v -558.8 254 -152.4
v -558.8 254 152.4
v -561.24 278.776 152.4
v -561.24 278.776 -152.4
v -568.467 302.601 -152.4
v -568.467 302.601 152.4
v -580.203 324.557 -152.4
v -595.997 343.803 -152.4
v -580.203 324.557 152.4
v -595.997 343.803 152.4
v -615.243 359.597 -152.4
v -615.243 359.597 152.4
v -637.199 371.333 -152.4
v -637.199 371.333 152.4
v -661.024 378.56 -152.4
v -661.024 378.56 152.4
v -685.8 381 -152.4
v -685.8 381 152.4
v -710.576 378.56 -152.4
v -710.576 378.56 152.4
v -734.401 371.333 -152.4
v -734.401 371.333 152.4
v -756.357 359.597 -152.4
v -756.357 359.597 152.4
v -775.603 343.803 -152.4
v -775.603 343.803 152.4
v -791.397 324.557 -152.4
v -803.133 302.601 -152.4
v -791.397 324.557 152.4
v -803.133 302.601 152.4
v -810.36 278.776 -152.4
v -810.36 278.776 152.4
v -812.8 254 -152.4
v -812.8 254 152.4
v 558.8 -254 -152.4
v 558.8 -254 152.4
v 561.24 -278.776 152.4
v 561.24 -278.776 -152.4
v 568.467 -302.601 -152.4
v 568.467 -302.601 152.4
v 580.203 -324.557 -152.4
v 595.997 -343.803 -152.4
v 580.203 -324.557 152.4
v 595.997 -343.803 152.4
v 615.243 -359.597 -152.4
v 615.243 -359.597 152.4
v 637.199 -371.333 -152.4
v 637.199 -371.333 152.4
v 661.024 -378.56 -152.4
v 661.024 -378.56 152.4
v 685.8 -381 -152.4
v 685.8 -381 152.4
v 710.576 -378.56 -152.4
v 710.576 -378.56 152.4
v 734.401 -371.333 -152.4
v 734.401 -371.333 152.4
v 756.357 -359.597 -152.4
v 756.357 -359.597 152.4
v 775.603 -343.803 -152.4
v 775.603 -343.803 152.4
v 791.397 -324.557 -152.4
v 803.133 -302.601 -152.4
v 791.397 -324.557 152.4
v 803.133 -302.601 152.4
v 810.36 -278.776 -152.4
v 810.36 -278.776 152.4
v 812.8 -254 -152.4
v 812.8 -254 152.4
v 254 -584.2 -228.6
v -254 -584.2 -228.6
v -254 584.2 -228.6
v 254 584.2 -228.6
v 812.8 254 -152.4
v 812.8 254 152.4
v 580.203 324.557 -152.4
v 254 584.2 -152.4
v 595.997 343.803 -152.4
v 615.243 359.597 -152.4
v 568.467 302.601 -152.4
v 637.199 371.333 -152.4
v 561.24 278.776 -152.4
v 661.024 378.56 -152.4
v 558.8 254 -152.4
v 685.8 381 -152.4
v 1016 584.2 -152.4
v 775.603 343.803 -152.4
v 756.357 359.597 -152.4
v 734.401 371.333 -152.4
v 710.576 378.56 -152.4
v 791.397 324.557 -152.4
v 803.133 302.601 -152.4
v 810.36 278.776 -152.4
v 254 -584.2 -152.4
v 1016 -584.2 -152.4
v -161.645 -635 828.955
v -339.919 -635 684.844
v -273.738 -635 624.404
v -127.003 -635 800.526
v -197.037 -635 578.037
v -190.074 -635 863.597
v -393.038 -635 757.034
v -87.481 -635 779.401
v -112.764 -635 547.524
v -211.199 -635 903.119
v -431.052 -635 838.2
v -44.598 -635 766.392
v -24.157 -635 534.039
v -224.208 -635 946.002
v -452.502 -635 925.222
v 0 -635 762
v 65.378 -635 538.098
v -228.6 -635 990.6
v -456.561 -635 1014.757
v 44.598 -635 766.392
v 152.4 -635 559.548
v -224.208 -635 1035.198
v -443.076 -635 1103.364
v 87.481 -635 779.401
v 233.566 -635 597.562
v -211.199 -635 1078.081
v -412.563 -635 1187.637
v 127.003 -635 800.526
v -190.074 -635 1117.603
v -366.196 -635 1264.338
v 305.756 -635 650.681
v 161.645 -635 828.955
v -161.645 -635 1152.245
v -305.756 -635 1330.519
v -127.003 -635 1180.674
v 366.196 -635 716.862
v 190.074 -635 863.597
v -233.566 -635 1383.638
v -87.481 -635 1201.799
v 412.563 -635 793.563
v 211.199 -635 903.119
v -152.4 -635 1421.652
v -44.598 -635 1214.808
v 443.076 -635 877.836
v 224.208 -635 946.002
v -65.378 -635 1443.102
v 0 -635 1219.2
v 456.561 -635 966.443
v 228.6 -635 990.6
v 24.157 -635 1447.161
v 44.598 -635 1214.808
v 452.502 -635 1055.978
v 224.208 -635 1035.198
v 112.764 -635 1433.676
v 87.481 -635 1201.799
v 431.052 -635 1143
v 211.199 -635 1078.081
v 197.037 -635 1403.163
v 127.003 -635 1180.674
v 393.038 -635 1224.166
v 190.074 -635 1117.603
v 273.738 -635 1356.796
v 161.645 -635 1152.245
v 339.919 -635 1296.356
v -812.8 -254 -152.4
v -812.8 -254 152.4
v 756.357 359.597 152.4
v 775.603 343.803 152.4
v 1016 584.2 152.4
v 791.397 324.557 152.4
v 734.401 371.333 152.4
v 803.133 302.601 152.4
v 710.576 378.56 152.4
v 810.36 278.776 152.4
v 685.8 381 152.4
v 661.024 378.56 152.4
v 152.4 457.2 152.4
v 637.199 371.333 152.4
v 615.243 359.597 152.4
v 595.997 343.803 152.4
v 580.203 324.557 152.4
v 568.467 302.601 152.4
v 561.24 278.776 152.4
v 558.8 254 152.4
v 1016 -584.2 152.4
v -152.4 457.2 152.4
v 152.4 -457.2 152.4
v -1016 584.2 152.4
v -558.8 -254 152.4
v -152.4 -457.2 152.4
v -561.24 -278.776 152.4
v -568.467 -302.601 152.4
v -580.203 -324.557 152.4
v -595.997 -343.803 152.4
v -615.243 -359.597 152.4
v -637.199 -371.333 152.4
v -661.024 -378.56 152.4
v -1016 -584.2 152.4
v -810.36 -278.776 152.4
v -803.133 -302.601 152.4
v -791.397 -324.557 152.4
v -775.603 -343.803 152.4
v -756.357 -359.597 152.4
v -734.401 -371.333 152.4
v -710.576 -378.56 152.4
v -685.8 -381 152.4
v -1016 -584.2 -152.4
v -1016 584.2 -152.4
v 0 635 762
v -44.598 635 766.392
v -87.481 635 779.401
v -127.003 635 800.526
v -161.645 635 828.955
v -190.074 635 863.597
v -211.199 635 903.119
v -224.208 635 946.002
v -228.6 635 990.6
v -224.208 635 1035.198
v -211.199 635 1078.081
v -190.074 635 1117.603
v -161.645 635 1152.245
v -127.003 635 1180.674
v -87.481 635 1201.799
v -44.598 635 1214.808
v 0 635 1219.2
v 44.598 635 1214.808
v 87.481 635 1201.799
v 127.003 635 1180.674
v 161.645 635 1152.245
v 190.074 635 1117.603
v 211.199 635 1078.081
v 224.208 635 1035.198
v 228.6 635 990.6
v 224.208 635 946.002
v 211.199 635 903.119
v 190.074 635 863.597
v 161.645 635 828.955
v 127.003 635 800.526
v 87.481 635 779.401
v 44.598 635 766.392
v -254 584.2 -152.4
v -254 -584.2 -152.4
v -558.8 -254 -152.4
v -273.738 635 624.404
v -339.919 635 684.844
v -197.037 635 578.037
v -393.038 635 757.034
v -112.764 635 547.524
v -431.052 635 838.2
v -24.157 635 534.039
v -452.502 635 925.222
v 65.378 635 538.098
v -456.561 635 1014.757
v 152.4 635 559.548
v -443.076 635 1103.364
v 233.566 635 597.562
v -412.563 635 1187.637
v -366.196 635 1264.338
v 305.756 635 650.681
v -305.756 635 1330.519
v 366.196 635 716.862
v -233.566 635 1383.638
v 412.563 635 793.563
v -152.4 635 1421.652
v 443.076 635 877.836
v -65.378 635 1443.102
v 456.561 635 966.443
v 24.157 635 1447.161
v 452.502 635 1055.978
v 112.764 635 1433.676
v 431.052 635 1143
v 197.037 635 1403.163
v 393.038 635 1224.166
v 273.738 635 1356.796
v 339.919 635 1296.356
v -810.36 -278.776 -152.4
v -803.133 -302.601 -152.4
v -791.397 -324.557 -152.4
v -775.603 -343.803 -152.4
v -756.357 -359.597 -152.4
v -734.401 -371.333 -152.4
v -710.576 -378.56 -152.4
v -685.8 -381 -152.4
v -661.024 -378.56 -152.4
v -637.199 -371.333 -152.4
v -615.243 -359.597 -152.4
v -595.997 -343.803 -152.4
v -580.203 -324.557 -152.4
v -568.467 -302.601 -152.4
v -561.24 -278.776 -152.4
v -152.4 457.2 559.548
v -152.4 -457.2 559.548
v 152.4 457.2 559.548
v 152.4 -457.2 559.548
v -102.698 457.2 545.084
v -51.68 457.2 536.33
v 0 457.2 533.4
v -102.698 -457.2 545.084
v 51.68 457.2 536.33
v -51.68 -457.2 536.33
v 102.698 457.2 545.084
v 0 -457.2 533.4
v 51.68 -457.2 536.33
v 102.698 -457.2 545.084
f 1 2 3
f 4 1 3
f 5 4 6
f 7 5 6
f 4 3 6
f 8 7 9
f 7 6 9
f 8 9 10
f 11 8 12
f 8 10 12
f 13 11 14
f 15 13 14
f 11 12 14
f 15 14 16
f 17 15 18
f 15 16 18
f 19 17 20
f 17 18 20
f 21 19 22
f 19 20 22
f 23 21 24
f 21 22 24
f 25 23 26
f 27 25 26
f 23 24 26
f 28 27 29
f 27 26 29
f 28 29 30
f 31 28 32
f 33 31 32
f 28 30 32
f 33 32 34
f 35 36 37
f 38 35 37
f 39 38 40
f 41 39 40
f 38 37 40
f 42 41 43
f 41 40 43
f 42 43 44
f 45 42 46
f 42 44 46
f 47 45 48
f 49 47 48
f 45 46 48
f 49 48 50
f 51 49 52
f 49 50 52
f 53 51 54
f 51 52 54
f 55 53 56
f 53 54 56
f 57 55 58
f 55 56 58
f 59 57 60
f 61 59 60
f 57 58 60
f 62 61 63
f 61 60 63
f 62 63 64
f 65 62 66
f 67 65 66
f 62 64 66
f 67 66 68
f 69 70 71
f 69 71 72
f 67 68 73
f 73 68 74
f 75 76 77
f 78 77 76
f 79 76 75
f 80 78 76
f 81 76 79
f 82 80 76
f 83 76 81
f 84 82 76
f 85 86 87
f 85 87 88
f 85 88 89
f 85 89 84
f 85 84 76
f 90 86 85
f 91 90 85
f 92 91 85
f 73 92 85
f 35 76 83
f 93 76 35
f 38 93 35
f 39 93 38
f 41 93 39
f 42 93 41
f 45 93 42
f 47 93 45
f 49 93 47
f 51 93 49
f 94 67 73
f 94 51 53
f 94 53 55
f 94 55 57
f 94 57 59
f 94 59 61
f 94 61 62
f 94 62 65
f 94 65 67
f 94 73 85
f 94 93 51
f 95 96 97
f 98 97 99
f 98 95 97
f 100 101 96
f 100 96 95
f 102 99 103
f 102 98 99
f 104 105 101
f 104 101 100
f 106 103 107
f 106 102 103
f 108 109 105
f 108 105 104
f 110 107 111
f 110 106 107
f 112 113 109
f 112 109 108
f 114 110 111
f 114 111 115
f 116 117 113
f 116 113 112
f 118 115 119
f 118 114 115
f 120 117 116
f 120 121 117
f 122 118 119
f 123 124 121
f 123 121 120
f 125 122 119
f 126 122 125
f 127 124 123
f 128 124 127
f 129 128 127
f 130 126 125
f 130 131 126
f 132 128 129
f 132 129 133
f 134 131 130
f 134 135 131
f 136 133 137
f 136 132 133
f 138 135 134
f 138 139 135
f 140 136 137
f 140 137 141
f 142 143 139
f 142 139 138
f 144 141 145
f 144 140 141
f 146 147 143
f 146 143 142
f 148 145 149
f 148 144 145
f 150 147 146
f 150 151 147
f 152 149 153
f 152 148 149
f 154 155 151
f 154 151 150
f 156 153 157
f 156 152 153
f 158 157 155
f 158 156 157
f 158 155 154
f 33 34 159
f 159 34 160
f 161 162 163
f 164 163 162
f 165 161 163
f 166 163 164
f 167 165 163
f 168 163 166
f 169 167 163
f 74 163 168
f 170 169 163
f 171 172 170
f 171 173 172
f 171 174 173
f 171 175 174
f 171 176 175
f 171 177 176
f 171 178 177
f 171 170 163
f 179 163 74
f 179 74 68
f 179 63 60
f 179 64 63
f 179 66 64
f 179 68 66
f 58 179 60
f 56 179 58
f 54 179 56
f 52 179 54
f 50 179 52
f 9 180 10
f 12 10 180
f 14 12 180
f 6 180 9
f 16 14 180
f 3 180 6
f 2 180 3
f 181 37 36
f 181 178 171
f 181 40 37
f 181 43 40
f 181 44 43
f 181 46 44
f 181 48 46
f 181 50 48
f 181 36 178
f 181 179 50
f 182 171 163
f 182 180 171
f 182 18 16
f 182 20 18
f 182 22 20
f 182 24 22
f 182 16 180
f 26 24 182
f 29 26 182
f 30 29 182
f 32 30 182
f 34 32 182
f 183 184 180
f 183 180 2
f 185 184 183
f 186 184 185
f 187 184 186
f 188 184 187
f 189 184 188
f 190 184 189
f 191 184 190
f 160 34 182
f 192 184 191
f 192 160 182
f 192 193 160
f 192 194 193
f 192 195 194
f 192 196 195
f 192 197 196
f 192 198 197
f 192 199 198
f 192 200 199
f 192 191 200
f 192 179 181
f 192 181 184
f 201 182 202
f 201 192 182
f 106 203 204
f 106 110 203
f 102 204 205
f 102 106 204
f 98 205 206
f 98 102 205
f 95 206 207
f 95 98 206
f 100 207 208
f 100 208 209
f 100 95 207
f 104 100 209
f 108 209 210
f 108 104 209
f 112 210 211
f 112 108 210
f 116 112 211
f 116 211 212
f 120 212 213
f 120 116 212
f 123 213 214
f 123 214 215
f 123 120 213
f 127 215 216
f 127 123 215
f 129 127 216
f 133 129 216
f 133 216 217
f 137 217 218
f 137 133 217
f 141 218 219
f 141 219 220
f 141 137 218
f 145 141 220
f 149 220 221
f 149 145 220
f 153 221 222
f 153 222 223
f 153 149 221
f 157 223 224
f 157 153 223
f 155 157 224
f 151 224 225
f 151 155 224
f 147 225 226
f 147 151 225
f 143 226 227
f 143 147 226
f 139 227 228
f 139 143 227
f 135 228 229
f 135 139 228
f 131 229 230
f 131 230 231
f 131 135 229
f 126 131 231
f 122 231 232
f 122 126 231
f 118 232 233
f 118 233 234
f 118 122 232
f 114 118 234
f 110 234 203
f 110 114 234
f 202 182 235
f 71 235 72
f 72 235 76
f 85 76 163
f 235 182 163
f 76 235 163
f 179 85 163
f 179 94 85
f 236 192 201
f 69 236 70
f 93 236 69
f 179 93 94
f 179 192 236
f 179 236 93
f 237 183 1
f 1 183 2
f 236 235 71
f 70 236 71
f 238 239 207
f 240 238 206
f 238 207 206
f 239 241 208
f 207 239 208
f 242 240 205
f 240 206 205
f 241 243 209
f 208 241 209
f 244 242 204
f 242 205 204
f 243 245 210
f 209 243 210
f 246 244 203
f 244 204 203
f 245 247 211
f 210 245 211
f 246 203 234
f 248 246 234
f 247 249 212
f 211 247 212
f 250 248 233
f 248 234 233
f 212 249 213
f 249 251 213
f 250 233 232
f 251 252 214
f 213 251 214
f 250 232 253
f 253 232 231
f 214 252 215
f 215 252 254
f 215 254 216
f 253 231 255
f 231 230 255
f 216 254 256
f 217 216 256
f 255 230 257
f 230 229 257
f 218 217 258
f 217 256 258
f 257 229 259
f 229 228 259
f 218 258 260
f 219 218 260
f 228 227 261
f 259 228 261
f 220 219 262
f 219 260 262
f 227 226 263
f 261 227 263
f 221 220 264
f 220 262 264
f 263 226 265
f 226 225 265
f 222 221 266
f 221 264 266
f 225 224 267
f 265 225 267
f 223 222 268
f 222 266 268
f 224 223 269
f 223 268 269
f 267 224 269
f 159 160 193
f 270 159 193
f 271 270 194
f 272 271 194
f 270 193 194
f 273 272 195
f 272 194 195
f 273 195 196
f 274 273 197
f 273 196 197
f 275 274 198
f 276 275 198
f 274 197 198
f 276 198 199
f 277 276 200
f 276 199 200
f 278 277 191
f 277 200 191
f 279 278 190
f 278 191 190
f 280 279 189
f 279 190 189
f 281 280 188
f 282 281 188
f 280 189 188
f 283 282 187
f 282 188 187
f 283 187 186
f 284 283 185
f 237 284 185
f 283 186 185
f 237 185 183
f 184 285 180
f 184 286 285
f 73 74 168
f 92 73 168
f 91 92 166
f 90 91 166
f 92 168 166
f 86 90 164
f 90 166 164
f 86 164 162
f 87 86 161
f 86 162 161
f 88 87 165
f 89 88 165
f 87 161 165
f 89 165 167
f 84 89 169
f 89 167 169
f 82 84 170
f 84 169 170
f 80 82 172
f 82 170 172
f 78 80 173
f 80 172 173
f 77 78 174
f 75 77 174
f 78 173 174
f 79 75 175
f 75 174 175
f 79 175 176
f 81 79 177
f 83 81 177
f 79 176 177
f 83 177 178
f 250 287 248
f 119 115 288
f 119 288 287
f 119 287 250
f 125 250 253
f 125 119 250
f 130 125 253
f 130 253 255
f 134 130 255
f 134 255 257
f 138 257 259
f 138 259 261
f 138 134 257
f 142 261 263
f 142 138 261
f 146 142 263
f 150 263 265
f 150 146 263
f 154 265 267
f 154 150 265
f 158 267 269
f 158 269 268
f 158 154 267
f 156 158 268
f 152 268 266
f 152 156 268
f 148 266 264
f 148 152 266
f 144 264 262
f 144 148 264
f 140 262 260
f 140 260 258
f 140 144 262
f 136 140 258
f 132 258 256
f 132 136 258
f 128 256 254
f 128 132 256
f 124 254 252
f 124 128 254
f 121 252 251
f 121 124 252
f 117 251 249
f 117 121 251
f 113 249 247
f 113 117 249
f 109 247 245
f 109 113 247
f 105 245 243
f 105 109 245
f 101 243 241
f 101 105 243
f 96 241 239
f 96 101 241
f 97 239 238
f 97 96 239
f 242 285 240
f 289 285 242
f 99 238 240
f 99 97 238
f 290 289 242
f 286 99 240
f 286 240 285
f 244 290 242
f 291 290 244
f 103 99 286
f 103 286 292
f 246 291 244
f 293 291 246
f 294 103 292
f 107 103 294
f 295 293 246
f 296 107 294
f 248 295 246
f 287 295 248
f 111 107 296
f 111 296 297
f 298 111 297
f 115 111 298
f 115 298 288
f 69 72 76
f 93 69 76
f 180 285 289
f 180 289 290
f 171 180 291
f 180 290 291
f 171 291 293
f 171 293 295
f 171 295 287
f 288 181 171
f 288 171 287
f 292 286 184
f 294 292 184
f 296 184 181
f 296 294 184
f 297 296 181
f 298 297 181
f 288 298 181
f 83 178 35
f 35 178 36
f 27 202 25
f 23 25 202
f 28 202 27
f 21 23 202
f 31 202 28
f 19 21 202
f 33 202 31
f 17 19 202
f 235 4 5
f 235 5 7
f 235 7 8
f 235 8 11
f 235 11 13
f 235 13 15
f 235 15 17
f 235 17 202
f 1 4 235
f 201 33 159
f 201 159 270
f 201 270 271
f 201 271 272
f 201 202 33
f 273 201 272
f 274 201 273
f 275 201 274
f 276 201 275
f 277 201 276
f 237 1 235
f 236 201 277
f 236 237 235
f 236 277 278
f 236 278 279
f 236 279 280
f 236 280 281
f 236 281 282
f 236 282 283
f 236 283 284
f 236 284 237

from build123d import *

# Parameters (mm, degrees)
F1_DEPTH = 584.2
F2_DEPTH = 457.2
F3_DEPTH = 635
F5_DEPTH = 381.001


with BuildPart() as f1:
    # F0 (on Front) → F1 (new body, symmetric)
    with BuildSketch(Plane.XZ):
        Polygon((0, -152.4), (0, 152.4), (-152.4, 152.4), (-1016, 152.4), (-1016, -152.4), (-254, -152.4), align=None)
        Polygon((1016, -152.4), (1016, 152.4), (152.4, 152.4), (0, 152.4), (0, -152.4), (254, -152.4), align=None)
        Polygon((254, -228.6), (254, -152.4), (0, -152.4), (-254, -152.4), (-254, -228.6), align=None)
    extrude(amount=F1_DEPTH, both=True)

    # F0 (on Front) → F2 (join, symmetric)
    with BuildSketch(Plane.XZ):
        with BuildLine():
            Line((-152.4, 152.4), (0, 152.4))
            Line((0, 152.4), (0, 533.4))
            ThreePointArc((0, 533.4), (-77.3134246734, 539.9843385264), (-152.4, 559.5477061887))
            Line((-152.4, 559.5477061887), (-152.4, 152.4))
        make_face()
        with BuildLine():
            Line((0, 152.4), (152.4, 152.4))
            Line((152.4, 152.4), (152.4, 559.5477061887))
            ThreePointArc((152.4, 559.5477061887), (77.3134246734, 539.9843385264), (0, 533.4))
            Line((0, 533.4), (0, 152.4))
        make_face()
    extrude(amount=F2_DEPTH, both=True)

    # F0 (on Front) → F3 (join, symmetric)
    with BuildSketch(Plane.XZ):
        with BuildLine():
            Line((152.4, 685.8), (152.4, 559.5477061887))
            ThreePointArc((152.4, 559.5477061887), (373.3022368002, 726.6354569265), (457.2, 990.6))
            ThreePointArc((457.2, 990.6), (-263.9645430735, 1363.9022368002), (-152.4, 559.5477061887))
            Line((-152.4, 559.5477061887), (-152.4, 685.8))
            Line((-152.4, 685.8), (0, 685.8))
            Line((0, 685.8), (152.4, 685.8))
        make_face()
        with BuildLine():
            ThreePointArc((228.6, 990.6), (161.6446101792, 828.9553898208), (0, 762))
            ThreePointArc((0, 762), (-161.6446101792, 1152.2446101792), (228.6, 990.6))
        make_face(mode=Mode.SUBTRACT)
        with BuildLine():
            ThreePointArc((-152.4, 559.5477061887), (-77.3134246734, 539.9843385264), (0, 533.4))
            Line((0, 533.4), (0, 685.8))
            Line((0, 685.8), (-152.4, 685.8))
            Line((-152.4, 685.8), (-152.4, 559.5477061887))
        make_face()
        with BuildLine():
            ThreePointArc((0, 533.4), (77.3134246734, 539.9843385264), (152.4, 559.5477061887))
            Line((152.4, 559.5477061887), (152.4, 685.8))
            Line((152.4, 685.8), (0, 685.8))
            Line((0, 685.8), (0, 533.4))
        make_face()
    extrude(amount=F3_DEPTH, both=True)

    # F4 (on face) → F5 (cut, through all)
    with BuildSketch(Plane.XY.offset(152.4)):
        Polygon((-812.8, 254), (-812.8, 0), (-812.8, -254), (-558.8, -254), (-558.8, 254), align=None)
        with BuildLine():
            ThreePointArc((-558.8, 254), (-685.8, 381), (-812.8, 254))
            Line((-812.8, 254), (-558.8, 254))
        make_face()
        with BuildLine():
            Line((-558.8, -254), (-812.8, -254))
            ThreePointArc((-812.8, -254), (-685.8, -381), (-558.8, -254))
        make_face()
        Polygon((812.8, -254), (812.8, 0), (812.8, 254), (558.8, 254), (558.8, -254), align=None)
        with BuildLine():
            Line((558.8, 254), (812.8, 254))
            ThreePointArc((812.8, 254), (685.8, 381), (558.8, 254))
        make_face()
        with BuildLine():
            ThreePointArc((558.8, -254), (685.8, -381), (812.8, -254))
            Line((812.8, -254), (558.8, -254))
        make_face()
    extrude(amount=-F5_DEPTH, mode=Mode.SUBTRACT)


solid = f1.part
